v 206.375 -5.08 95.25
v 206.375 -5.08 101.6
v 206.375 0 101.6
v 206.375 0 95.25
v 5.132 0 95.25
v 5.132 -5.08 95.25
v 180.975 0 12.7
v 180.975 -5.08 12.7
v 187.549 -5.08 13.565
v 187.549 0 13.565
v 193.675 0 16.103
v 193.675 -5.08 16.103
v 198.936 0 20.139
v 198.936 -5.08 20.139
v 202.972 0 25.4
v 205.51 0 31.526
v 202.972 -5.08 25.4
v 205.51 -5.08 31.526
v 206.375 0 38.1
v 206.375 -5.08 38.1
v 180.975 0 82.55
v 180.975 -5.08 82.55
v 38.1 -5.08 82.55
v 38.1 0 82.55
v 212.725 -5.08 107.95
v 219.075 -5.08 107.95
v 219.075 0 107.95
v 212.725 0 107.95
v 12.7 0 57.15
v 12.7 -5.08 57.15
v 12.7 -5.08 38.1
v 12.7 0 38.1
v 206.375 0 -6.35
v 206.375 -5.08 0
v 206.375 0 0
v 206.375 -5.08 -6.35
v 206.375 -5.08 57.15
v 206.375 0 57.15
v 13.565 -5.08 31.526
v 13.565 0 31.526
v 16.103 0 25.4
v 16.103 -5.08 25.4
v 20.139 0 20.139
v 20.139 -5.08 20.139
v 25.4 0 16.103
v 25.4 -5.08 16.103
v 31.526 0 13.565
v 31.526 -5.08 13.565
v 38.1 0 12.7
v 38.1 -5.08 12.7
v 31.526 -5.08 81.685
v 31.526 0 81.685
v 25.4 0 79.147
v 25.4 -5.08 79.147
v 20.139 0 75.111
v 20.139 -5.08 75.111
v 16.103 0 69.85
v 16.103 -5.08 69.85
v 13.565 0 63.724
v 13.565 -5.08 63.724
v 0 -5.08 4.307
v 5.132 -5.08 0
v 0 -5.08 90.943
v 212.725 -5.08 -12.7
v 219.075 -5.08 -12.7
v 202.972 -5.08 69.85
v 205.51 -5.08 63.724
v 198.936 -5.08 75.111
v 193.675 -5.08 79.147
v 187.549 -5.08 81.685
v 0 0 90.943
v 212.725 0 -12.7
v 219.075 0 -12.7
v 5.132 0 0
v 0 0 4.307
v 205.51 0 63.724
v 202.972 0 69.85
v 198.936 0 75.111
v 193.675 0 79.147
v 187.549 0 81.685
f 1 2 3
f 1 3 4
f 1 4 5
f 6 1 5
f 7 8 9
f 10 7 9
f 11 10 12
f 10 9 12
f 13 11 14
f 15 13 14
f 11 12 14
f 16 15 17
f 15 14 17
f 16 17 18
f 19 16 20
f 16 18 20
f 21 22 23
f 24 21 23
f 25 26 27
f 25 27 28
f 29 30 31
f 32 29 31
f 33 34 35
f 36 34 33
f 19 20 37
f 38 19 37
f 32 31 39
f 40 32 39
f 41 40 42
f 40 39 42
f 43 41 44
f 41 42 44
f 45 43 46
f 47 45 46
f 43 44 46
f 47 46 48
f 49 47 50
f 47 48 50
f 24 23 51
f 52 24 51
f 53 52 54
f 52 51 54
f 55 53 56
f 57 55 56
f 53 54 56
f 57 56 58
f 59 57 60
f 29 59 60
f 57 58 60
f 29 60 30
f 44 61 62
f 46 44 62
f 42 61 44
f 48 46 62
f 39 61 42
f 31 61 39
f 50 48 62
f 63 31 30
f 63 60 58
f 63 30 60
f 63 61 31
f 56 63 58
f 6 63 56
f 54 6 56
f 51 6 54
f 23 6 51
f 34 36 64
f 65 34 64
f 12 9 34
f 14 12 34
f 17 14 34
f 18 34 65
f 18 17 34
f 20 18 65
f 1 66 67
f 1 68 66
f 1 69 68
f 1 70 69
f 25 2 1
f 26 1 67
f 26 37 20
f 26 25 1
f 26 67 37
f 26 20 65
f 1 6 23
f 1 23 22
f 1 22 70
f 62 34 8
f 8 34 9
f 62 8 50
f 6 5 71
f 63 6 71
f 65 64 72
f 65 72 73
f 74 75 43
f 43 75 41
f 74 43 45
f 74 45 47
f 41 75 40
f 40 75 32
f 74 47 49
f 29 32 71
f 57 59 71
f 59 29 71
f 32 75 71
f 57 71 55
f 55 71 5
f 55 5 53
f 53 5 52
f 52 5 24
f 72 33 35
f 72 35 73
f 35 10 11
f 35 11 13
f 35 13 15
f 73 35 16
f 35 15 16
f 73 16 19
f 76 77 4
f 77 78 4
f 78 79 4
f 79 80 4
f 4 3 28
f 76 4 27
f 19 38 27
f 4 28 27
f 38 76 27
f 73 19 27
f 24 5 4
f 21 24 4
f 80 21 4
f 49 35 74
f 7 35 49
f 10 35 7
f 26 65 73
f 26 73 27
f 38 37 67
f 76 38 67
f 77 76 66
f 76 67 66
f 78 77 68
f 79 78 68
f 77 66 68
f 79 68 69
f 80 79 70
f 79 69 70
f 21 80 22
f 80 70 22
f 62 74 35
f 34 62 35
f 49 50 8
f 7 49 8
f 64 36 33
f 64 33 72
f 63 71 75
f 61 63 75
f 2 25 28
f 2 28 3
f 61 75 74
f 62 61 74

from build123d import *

# Parameters (mm, degrees)
F1_DEPTH = 5.08
F3_DEPTH = 5.081
F5_DEPTH = 5.08


with BuildPart() as f1:
    # F0 (on Front) → F1 (new body)
    with BuildSketch(Plane.XZ):
        Polygon((0, 4.306565316), (5.132364687, 0), (219.075, 0), (219.075, 95.25), (5.132364687, 95.25), (0, 90.943434684), align=None)
    extrude(amount=F1_DEPTH)

    # F2 (on face) → F3 (cut, through all)
    with BuildSketch(Plane.XZ.offset(5.08)):
        with BuildLine():
            Line((12.7, 57.15), (12.7, 38.1))
            ThreePointArc((12.7, 38.1), (20.1394877579, 20.1394877579), (38.1, 12.7))
            Line((38.1, 12.7), (180.975, 12.7))
            ThreePointArc((180.975, 12.7), (198.9355122421, 20.1394877579), (206.375, 38.1))
            Line((206.375, 38.1), (206.375, 57.15))
            ThreePointArc((206.375, 57.15), (198.9355122421, 75.1105122421), (180.975, 82.55))
            Line((180.975, 82.55), (38.1, 82.55))
            ThreePointArc((38.1, 82.55), (20.1394877579, 75.1105122421), (12.7, 57.15))
        make_face()
    extrude(amount=-F3_DEPTH, mode=Mode.SUBTRACT)

    # F4 (on face) → F5 (join)
    with BuildSketch(Plane.XZ.offset(5.08)):
        Polygon((212.725, -12.7), (219.075, -12.7), (219.075, 0), (206.375, 0), (206.375, -6.35), align=None)
        Polygon((206.375, 95.25), (219.075, 95.25), (219.075, 107.95), (212.725, 107.95), (206.375, 101.6), align=None)
        Polygon((206.375, 0), (219.075, 0), (219.075, 95.25), (206.375, 95.25), (206.375, 57.15), (206.375, 38.1), align=None)
    extrude(amount=-F5_DEPTH)


solid = f1.part
